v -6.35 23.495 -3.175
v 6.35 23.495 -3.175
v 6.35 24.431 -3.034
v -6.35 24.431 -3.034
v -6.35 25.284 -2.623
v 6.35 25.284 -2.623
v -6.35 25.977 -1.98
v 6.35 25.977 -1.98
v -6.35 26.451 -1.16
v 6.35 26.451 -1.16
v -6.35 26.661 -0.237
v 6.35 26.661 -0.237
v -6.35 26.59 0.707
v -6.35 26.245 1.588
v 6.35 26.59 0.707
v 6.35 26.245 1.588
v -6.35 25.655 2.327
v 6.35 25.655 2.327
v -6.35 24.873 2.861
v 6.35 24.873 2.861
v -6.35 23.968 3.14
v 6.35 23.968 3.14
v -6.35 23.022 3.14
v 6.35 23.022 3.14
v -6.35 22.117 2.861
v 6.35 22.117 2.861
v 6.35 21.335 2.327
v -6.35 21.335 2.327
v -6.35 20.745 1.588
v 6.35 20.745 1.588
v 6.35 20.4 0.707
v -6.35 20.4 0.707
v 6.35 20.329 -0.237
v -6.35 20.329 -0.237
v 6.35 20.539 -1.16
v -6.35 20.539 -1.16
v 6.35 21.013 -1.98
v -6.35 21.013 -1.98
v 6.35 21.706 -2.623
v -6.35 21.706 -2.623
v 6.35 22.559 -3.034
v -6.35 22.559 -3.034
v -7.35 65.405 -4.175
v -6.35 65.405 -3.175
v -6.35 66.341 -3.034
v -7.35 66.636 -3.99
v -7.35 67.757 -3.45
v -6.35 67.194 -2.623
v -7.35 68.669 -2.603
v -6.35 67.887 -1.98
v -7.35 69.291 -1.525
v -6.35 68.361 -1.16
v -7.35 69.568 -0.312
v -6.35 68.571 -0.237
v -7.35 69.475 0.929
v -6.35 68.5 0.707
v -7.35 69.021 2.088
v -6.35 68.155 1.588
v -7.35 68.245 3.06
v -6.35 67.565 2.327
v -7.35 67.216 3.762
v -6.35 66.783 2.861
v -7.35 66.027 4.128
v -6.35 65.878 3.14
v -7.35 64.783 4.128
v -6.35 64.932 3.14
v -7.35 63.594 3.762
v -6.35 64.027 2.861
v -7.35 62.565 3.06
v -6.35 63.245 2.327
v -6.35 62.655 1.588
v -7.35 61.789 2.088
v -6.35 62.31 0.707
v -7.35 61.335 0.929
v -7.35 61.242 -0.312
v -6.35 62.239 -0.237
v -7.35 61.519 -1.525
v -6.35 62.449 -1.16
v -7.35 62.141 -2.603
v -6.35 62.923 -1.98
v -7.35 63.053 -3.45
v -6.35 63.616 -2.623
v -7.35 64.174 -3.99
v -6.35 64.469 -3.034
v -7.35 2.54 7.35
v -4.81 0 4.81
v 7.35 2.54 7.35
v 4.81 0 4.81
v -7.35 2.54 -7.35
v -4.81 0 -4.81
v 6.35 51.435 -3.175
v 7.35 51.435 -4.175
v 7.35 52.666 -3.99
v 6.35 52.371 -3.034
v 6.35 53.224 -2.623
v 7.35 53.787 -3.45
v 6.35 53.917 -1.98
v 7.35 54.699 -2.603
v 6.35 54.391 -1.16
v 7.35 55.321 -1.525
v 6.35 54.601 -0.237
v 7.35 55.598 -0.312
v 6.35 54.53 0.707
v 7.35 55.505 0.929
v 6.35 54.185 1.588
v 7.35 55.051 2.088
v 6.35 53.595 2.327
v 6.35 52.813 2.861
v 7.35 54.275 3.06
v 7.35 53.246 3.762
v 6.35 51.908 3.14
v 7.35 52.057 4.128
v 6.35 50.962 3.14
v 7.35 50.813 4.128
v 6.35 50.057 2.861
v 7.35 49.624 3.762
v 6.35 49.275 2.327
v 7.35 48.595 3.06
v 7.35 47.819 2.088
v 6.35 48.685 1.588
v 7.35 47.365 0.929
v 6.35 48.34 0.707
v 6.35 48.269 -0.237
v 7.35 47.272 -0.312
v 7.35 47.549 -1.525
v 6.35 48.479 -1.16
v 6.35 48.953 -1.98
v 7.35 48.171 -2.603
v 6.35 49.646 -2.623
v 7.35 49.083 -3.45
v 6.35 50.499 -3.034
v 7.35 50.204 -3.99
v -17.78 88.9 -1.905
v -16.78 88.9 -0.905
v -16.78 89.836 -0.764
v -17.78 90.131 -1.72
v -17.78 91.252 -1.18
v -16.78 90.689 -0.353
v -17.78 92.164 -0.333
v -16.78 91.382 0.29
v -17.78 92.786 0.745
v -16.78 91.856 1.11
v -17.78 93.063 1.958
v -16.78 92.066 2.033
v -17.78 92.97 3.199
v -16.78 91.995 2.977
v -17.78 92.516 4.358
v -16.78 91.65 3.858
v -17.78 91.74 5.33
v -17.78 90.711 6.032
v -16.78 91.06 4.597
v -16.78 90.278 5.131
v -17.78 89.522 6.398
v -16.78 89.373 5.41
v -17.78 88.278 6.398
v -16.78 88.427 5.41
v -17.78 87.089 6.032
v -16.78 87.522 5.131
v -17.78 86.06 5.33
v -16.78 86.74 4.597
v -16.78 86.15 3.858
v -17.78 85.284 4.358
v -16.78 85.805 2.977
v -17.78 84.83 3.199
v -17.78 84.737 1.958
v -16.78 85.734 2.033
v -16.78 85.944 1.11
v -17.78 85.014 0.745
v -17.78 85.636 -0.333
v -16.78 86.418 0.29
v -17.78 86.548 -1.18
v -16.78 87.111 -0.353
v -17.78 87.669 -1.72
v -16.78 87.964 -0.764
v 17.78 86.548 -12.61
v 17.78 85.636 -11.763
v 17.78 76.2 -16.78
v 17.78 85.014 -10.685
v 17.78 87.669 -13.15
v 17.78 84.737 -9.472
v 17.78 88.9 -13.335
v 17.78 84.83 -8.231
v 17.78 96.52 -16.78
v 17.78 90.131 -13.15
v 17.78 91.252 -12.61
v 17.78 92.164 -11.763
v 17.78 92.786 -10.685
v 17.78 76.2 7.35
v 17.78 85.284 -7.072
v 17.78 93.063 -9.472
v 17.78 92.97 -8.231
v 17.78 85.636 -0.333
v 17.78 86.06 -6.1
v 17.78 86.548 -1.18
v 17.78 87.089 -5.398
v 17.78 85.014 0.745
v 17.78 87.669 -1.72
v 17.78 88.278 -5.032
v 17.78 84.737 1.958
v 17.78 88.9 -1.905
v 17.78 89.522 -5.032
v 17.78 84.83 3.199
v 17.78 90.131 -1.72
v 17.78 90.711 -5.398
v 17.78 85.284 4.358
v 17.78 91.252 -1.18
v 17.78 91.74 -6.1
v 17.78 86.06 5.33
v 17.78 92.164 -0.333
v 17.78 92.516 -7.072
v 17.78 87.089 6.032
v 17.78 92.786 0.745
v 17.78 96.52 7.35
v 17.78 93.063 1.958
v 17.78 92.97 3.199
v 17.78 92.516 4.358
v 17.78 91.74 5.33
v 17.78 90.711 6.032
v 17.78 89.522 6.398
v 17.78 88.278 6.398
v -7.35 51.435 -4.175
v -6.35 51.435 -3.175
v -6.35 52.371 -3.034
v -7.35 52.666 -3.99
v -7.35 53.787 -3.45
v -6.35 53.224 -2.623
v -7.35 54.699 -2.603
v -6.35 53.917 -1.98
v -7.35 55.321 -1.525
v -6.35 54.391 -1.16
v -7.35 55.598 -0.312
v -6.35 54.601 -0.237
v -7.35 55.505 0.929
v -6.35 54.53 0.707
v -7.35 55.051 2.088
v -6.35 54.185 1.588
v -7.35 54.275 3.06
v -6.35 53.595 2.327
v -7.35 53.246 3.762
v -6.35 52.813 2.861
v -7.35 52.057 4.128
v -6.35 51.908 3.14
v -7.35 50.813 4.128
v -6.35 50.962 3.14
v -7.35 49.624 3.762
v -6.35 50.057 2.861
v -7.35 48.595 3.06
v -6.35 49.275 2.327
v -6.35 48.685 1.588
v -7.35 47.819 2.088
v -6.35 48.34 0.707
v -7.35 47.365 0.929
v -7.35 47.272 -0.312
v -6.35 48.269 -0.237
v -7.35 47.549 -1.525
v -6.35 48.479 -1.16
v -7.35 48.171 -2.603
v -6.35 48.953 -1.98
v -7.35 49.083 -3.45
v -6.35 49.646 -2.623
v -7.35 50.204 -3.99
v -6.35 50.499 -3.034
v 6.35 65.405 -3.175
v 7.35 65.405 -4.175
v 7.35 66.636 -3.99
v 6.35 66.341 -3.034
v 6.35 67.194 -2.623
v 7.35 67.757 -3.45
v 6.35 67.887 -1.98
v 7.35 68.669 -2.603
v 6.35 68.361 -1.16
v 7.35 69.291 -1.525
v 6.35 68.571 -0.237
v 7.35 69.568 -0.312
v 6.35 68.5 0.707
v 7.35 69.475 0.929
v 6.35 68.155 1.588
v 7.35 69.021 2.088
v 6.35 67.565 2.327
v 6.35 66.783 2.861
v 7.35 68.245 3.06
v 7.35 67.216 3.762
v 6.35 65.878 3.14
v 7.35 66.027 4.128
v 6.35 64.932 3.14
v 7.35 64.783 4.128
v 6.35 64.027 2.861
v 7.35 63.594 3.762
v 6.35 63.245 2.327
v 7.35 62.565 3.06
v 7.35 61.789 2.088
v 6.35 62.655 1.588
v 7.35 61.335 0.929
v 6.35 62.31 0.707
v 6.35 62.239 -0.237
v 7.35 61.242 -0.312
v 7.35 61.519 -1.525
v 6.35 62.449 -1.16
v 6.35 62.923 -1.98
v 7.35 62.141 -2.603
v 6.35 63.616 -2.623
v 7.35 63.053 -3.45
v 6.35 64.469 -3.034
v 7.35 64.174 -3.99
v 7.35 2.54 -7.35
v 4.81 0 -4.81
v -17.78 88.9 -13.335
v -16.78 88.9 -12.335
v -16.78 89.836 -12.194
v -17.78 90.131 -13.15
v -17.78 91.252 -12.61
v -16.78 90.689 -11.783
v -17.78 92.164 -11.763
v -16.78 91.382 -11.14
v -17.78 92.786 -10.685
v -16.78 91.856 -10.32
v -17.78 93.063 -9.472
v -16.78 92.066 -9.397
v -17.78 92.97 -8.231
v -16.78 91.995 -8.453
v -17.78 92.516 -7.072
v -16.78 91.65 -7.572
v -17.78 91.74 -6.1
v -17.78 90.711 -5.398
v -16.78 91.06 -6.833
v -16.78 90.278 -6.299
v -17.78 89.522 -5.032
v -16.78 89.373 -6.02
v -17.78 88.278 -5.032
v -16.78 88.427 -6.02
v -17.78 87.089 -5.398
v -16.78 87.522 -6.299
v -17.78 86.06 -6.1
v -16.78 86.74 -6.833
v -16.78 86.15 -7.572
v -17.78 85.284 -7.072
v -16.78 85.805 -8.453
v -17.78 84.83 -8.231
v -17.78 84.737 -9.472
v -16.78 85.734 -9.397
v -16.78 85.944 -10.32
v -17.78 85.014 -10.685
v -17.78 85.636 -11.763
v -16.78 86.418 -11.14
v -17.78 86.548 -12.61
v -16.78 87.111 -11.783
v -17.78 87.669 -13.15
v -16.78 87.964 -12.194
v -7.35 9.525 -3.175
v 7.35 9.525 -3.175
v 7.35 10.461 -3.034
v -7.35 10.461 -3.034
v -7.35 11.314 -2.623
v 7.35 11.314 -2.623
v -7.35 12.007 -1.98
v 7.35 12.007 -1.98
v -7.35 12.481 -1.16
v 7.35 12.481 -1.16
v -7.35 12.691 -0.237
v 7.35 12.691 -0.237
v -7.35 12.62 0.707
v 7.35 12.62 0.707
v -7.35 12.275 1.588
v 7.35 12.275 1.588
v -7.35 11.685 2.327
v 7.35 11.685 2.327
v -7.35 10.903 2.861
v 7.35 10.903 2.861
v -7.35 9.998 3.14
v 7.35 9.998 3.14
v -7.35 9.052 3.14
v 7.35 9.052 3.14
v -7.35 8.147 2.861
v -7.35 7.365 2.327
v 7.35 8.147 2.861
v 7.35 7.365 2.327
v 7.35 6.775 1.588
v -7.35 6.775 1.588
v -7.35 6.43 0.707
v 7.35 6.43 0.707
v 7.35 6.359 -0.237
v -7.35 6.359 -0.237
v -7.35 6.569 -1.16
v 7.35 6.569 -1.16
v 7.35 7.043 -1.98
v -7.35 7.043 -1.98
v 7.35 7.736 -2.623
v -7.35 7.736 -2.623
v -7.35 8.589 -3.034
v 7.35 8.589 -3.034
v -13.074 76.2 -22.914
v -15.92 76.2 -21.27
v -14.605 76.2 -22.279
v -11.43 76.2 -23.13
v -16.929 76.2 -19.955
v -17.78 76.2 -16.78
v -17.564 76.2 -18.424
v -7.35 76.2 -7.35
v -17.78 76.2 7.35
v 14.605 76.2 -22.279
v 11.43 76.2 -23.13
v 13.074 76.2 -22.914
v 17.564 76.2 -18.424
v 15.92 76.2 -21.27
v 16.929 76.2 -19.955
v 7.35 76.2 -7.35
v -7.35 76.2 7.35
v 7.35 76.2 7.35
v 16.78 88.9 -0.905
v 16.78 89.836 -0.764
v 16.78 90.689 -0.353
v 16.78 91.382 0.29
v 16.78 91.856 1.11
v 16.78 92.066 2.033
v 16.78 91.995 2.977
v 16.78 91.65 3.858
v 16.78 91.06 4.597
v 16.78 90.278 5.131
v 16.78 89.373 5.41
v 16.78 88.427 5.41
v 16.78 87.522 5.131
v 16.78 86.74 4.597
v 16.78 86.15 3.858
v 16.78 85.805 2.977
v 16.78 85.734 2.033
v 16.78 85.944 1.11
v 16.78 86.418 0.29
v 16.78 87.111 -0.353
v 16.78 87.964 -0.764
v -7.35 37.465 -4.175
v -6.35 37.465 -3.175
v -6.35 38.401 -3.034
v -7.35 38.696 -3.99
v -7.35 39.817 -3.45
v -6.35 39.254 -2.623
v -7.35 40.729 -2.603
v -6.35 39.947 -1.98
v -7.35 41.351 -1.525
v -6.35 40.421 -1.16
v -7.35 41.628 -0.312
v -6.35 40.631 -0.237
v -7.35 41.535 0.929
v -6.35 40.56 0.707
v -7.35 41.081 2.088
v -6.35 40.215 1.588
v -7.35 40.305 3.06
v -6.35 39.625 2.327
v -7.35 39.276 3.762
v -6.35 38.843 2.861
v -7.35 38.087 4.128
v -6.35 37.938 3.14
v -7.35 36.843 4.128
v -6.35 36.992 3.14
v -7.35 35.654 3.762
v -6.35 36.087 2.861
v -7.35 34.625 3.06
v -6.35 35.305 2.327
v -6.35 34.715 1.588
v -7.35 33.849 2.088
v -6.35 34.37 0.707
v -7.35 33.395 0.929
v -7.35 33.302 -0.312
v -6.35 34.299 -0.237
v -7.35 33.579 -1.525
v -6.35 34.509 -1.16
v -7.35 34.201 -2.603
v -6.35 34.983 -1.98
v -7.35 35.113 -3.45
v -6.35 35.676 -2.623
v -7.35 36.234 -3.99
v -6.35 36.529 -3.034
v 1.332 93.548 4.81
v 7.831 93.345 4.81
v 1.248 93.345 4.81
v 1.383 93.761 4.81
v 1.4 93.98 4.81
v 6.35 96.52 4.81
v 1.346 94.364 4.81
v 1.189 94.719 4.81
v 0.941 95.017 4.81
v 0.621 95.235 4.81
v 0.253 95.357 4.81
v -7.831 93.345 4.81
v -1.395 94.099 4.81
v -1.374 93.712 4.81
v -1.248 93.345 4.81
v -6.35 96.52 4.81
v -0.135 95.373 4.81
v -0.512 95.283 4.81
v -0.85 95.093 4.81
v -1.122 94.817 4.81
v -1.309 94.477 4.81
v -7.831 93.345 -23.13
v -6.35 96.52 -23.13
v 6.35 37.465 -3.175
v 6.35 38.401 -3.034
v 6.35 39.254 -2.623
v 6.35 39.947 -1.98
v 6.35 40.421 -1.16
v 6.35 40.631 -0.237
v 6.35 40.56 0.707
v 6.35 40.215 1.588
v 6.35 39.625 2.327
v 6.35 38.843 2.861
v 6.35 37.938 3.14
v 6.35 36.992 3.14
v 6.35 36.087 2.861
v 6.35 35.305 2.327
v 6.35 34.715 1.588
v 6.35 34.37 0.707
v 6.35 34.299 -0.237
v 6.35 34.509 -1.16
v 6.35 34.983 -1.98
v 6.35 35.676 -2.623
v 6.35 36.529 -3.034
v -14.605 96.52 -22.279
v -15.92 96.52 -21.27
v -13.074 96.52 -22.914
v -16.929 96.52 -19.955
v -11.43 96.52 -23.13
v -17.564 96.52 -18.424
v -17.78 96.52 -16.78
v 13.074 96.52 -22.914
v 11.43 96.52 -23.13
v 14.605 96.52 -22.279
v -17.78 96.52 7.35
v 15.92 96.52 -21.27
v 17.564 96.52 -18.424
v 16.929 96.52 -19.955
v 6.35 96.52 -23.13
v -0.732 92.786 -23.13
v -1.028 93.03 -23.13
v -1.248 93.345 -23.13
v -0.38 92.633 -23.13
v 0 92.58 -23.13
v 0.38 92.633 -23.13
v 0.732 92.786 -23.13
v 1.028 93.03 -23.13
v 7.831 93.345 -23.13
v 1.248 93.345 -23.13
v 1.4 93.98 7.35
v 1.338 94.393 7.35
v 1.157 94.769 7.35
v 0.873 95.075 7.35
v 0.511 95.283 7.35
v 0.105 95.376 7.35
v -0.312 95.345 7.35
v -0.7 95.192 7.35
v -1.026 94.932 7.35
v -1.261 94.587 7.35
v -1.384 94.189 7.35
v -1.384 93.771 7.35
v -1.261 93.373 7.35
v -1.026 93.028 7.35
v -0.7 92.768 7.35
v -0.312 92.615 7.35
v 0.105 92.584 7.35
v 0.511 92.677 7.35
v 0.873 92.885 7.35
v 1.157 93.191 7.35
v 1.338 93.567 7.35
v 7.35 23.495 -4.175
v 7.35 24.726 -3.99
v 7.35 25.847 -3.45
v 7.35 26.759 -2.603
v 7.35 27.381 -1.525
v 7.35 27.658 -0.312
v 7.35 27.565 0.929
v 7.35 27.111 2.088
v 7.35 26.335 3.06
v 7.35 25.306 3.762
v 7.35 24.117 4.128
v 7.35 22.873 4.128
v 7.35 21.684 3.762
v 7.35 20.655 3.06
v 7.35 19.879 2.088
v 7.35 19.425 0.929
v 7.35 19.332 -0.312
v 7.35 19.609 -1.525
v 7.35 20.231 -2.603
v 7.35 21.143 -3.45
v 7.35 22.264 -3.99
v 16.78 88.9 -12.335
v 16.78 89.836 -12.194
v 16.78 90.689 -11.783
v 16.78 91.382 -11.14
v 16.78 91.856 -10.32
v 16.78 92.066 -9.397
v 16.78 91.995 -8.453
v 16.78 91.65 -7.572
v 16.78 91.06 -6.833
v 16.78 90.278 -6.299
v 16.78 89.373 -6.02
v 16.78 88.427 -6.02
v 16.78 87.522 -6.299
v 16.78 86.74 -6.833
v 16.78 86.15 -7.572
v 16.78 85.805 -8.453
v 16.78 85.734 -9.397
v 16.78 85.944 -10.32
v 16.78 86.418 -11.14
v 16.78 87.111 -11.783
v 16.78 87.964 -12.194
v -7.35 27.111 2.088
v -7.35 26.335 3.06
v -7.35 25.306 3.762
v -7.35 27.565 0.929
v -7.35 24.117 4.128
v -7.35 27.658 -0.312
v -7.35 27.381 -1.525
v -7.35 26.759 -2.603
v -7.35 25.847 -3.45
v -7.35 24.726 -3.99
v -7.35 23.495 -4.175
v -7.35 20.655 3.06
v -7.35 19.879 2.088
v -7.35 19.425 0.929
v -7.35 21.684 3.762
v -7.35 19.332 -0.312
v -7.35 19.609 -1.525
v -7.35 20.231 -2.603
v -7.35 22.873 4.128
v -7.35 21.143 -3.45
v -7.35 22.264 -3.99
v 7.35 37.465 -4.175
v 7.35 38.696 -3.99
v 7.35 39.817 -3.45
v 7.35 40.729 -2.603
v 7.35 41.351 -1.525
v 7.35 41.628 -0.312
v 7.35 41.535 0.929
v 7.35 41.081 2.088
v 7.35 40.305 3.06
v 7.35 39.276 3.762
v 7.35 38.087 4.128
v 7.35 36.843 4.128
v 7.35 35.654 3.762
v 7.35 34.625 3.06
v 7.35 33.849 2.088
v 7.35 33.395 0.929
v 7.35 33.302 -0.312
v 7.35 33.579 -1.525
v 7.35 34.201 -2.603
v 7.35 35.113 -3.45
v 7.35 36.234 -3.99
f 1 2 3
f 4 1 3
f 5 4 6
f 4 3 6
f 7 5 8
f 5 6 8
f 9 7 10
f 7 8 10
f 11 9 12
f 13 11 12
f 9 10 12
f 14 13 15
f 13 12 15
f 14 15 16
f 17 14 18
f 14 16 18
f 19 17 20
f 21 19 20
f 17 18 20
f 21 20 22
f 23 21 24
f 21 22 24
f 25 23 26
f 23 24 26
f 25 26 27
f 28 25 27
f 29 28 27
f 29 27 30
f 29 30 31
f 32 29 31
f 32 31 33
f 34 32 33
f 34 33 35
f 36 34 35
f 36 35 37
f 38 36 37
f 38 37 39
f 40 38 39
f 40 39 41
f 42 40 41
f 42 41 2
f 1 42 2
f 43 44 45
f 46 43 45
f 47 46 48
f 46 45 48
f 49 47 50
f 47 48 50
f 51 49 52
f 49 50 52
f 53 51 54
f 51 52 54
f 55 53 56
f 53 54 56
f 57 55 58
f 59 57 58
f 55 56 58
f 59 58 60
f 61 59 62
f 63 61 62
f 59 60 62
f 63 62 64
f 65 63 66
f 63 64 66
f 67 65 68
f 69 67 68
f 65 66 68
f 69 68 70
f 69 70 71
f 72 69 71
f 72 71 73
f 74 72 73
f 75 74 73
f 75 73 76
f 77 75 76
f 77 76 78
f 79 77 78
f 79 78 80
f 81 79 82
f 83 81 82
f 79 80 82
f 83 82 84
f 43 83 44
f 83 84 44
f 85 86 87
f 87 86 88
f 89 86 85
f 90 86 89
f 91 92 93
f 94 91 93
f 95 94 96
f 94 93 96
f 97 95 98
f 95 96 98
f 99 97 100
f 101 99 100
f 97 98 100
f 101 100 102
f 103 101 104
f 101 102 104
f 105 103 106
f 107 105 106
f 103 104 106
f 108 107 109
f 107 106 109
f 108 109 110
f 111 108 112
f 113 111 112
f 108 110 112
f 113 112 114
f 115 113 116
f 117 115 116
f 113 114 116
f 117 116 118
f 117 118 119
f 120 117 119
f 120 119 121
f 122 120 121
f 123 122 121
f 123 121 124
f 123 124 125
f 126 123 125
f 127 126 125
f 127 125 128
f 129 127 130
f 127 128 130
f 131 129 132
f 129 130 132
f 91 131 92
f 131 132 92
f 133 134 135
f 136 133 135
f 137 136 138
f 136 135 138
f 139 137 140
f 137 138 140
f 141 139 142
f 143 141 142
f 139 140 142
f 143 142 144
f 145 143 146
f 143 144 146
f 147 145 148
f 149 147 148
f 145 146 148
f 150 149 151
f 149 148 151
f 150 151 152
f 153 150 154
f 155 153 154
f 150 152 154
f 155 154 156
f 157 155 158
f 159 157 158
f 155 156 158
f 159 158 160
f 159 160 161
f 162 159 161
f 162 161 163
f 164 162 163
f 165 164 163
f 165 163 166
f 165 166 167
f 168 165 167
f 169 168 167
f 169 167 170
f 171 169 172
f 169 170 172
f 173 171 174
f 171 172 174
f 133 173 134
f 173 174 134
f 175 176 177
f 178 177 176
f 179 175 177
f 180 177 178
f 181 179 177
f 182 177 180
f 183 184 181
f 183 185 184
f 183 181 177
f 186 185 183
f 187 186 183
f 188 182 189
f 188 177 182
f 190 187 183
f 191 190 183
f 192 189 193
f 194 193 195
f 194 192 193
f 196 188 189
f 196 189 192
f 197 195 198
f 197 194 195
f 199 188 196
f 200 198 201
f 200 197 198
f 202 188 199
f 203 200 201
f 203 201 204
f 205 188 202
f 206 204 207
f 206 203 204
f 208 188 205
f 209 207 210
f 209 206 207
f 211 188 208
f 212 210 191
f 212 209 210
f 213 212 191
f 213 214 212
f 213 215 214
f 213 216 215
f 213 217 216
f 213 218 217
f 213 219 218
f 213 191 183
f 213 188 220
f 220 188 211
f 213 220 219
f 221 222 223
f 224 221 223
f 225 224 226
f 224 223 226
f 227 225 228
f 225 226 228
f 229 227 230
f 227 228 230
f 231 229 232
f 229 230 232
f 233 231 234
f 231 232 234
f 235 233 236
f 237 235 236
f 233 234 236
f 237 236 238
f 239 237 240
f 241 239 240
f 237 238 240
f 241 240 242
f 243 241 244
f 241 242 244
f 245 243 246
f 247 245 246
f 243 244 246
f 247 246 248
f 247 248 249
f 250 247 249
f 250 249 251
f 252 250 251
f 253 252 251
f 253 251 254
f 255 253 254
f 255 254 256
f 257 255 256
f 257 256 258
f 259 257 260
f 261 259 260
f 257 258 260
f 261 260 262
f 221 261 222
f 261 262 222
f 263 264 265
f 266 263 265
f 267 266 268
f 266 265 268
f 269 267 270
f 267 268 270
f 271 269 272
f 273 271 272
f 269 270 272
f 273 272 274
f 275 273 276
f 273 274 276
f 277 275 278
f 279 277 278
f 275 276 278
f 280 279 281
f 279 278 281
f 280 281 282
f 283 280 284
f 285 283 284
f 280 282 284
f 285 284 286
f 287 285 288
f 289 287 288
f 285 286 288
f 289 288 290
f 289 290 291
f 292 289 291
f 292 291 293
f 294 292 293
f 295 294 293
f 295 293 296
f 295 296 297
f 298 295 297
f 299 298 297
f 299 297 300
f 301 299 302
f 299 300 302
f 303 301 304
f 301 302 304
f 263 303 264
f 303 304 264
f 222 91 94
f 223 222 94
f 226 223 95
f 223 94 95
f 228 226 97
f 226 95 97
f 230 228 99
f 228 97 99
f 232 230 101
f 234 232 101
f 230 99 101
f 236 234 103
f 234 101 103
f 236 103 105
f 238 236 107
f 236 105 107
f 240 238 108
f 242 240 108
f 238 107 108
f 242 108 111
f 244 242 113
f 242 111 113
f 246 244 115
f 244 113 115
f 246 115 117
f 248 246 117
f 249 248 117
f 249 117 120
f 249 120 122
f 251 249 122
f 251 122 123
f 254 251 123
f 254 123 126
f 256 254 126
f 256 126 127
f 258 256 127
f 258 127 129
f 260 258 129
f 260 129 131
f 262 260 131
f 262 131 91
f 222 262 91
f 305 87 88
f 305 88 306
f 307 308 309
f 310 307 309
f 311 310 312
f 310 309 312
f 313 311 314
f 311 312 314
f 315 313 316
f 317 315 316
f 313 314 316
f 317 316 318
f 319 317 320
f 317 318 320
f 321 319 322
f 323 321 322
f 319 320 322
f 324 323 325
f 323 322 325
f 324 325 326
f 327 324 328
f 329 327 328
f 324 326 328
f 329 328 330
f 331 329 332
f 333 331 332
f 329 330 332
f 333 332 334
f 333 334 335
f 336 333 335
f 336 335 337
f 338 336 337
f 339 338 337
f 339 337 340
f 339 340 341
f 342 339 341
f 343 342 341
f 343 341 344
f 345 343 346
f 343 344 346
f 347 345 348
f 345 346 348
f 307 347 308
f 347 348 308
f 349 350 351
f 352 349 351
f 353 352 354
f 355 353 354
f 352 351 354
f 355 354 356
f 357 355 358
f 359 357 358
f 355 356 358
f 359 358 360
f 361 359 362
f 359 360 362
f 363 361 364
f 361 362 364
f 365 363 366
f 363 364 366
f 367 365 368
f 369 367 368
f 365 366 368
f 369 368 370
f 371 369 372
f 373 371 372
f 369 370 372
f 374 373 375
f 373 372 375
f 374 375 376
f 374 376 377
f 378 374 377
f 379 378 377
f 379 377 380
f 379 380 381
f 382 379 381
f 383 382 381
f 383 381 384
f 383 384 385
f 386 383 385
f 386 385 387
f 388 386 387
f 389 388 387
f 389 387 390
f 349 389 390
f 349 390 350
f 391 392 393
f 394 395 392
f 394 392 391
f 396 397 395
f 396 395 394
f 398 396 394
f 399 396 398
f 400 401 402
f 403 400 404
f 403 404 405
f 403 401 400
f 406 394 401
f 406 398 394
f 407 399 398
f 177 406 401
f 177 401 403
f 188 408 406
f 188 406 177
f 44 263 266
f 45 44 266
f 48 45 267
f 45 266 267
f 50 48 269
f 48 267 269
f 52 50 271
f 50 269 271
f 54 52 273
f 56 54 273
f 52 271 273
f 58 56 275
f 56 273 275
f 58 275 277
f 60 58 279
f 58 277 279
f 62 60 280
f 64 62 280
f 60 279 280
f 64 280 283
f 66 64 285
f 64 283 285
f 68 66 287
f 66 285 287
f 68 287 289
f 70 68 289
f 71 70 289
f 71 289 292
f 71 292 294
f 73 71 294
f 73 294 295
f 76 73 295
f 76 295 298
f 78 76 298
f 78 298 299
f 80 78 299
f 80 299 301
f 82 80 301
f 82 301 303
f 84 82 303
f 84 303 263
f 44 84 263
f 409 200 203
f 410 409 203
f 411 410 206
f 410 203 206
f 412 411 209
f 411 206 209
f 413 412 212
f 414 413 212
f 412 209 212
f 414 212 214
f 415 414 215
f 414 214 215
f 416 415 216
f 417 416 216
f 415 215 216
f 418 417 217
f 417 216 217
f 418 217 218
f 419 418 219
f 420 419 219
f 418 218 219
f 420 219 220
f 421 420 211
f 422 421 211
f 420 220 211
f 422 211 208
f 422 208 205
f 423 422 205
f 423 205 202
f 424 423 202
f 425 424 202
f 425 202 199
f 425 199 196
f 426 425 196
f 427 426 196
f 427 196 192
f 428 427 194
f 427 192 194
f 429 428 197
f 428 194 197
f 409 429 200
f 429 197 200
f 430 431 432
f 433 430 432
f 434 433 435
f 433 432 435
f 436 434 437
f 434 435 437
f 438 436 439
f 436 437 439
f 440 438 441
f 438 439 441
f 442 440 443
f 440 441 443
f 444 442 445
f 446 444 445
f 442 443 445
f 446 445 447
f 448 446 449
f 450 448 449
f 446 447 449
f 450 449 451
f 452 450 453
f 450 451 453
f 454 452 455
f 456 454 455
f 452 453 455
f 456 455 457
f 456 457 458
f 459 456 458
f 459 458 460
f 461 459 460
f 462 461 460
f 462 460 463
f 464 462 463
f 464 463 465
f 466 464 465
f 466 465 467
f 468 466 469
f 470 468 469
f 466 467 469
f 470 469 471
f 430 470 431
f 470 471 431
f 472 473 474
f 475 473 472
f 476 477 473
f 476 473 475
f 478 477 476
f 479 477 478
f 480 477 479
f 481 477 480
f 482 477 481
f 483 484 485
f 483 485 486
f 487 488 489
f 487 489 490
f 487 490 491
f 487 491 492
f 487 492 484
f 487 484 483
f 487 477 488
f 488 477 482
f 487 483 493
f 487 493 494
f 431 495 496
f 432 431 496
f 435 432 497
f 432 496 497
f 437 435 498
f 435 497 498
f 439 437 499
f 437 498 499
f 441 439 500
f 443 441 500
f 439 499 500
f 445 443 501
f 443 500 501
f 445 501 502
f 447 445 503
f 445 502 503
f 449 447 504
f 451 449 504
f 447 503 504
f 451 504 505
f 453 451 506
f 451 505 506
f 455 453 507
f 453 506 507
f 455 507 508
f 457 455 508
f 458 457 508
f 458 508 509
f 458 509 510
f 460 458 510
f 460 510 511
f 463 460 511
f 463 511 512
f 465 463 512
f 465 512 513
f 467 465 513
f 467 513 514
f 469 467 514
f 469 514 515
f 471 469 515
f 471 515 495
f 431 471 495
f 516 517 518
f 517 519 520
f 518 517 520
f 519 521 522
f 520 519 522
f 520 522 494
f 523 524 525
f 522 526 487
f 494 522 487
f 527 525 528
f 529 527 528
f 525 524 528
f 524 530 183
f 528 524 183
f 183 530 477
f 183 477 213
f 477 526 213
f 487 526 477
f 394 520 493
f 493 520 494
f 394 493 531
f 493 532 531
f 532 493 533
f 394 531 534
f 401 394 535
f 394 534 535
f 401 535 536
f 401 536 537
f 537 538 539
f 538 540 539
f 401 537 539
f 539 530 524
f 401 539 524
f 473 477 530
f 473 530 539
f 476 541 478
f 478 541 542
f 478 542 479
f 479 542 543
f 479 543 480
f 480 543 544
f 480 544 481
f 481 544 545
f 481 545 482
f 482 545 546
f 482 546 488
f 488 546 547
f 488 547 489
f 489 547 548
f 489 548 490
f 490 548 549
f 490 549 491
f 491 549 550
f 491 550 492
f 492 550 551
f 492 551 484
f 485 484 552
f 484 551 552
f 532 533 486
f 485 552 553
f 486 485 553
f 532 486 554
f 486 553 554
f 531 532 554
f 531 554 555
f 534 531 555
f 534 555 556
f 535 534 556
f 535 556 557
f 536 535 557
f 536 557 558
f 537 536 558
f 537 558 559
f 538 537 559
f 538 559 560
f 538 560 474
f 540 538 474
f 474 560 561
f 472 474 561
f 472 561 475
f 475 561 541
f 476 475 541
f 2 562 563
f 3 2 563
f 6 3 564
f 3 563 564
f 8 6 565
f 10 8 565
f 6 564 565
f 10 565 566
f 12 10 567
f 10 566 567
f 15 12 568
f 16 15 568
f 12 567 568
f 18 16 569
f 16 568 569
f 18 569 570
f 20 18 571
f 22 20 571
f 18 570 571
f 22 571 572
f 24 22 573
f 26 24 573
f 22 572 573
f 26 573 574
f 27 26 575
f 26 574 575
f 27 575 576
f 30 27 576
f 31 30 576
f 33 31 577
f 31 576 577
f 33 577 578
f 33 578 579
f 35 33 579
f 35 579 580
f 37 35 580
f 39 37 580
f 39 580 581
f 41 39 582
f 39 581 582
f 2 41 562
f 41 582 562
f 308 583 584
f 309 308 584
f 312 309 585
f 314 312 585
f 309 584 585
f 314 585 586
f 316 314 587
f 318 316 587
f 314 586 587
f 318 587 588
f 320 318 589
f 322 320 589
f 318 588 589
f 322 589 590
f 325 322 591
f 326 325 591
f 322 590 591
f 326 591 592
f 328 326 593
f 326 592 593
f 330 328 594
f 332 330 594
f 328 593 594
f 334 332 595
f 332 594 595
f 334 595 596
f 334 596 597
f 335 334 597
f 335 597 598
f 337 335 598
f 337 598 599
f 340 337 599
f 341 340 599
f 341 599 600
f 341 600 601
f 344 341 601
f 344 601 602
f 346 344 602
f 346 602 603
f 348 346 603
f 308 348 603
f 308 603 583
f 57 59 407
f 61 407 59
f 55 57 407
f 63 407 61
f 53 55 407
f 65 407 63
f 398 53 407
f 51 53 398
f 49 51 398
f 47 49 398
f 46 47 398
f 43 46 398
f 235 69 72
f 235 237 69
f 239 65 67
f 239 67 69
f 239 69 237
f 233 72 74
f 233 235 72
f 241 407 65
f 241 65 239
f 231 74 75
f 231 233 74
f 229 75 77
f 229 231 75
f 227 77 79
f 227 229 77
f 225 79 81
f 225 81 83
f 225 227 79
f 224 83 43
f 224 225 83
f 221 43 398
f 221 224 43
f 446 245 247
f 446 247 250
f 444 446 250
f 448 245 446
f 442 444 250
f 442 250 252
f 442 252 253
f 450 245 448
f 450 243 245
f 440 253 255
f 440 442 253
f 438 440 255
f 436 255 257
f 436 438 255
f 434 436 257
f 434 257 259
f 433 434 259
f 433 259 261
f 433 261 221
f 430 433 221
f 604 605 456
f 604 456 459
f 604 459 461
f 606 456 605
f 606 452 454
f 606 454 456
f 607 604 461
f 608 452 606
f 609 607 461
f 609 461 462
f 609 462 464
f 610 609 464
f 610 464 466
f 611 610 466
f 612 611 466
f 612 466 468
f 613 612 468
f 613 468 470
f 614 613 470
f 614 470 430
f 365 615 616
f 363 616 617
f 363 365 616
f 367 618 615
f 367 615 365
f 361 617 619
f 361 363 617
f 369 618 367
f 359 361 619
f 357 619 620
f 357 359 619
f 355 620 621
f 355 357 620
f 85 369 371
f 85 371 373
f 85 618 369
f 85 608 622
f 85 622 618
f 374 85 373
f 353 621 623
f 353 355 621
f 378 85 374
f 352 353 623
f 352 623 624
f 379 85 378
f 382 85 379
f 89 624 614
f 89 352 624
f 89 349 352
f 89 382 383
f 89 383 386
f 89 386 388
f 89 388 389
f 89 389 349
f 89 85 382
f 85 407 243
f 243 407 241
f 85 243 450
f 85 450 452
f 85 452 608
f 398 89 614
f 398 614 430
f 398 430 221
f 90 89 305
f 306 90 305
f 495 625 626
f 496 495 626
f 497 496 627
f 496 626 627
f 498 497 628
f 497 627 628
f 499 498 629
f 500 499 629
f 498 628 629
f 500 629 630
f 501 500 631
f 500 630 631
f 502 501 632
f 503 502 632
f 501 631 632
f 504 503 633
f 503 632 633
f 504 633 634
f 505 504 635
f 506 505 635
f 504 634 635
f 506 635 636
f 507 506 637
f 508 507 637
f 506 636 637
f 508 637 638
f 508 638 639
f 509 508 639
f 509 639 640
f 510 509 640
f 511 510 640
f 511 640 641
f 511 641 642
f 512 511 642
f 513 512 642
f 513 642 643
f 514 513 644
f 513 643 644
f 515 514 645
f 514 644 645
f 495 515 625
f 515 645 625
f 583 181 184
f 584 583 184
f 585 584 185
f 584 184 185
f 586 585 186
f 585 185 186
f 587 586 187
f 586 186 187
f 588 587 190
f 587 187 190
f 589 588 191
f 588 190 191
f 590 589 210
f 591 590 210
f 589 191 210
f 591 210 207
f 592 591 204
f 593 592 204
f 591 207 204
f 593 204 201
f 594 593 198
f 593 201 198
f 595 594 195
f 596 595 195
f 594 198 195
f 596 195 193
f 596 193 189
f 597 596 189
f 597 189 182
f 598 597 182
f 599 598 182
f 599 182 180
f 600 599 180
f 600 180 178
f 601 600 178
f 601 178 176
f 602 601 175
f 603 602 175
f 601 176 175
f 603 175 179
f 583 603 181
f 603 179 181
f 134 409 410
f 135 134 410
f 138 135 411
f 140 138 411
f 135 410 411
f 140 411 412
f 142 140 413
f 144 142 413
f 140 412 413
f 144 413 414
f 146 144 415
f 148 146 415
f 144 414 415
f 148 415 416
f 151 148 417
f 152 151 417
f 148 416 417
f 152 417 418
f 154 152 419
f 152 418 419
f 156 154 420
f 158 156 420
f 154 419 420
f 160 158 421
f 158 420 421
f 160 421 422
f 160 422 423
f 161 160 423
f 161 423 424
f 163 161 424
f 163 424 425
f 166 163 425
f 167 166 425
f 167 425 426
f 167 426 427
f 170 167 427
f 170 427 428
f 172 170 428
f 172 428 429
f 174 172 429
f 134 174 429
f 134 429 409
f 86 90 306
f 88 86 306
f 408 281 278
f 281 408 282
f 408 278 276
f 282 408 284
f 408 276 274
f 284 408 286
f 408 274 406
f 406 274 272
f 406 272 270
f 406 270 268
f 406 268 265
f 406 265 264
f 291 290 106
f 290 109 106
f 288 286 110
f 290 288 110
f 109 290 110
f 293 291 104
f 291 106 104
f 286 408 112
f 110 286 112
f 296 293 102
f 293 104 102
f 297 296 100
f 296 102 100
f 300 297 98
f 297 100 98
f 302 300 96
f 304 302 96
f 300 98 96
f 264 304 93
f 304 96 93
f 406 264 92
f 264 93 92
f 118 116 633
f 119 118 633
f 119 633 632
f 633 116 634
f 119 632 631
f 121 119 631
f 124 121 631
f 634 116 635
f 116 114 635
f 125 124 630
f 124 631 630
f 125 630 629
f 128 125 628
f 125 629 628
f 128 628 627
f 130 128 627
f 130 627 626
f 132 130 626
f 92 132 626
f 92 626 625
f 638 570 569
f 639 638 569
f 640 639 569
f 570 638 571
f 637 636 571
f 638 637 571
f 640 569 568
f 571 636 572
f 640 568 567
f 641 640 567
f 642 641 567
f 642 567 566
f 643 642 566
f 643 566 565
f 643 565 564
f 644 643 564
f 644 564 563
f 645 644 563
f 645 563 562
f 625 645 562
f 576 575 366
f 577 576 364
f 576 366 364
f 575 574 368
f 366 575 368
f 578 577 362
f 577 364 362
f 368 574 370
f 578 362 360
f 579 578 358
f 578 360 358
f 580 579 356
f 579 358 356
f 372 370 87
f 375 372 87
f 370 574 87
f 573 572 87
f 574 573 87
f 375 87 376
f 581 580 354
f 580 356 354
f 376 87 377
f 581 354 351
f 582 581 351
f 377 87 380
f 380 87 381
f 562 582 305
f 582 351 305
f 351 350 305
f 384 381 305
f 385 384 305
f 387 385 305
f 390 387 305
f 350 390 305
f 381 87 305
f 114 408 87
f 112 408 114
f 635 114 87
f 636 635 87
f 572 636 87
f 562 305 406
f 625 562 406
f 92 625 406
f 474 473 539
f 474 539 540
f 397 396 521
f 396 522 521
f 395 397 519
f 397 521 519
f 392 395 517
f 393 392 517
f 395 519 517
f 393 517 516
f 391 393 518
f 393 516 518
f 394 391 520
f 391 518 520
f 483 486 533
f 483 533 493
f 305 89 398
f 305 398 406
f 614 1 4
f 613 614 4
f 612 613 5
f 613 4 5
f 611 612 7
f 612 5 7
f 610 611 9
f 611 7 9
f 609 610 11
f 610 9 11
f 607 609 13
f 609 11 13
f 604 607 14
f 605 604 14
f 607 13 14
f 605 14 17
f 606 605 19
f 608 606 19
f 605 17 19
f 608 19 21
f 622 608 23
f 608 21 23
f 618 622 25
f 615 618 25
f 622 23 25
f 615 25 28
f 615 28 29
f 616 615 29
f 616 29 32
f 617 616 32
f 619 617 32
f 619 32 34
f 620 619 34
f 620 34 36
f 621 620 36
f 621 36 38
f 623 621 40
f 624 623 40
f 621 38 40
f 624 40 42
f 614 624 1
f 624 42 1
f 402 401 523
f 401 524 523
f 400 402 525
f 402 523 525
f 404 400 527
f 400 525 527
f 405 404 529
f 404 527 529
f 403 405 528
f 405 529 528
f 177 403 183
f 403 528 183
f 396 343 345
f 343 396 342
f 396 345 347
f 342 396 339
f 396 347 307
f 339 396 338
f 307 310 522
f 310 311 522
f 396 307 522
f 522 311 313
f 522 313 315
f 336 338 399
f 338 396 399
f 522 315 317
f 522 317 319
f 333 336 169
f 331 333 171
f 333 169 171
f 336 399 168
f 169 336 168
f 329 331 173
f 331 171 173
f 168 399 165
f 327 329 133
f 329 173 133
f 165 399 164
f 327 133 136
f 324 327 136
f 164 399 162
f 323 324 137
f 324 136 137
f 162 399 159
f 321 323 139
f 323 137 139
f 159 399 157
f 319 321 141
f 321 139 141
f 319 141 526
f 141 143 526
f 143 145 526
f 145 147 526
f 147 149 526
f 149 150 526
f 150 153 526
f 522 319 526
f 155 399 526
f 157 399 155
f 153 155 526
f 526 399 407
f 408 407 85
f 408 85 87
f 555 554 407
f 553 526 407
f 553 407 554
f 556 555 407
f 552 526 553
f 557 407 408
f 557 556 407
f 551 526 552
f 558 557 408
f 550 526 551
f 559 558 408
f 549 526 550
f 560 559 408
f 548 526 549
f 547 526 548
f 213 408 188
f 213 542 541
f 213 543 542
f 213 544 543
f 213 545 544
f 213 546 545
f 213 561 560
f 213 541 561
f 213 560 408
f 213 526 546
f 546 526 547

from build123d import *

# Parameters (mm, degrees)
SKETCH1_W                 = 14.7
SKETCH1_H                 = 14.7
BOSS_EXTRUDE1_DEPTH       = 76.2
SKETCH6_R                 = 3.175
CUT_EXTRUDE4_DEPTH        = 78.952244997
CHAMFER5_SIZE             = 1
CHAMFER6_SIZE             = 2.54
SKETCH4_W                 = 35.56
SKETCH4_H                 = 20.32
BOSS_EXTRUDE2_DEPTH       = 30.48
SKETCH5_R                 = 3.175
TRAYSUPPORTMOUNTING_DEPTH = 106.430644976
CHAMFER4_SIZE             = 1
CUT_EXTRUDE5_DEPTH        = 27.94
FILLET1_R                 = 6.35
SKETCH8_R                 = 1.4
CUT_EXTRUDE6_DEPTH        = 103.768035887


with BuildPart() as part:
    # Sketch1 → Boss-Extrude1 (new body)
    with BuildSketch(Plane(origin=(0, 0, 0), x_dir=(1, 0, 0), z_dir=(0, 1, 0))):
        Rectangle(SKETCH1_W, SKETCH1_H)
    extrude(amount=BOSS_EXTRUDE1_DEPTH)

    # Sketch6 → Cut-Extrude4 (cut, through all)
    with BuildSketch(Plane(origin=(7.35, 0, 0), x_dir=(0, 0, -1), z_dir=(1, 0, 0))):
        with Locations((0, 65.405)):
            Circle(SKETCH6_R)
        with Locations((0, 51.435)):
            Circle(SKETCH6_R)
        with Locations((0, 37.465)):
            Circle(SKETCH6_R)
        with Locations((0, 23.495)):
            Circle(SKETCH6_R)
        with Locations((0, 9.525)):
            Circle(SKETCH6_R)
    extrude(amount=-CUT_EXTRUDE4_DEPTH, mode=Mode.SUBTRACT)

    # Chamfer5
    chamfer5_edges = [part.edges().sort_by_distance(p)[0] for p in [
        (-7.35, 65.405, 3.175),
        (7.35, 65.405, 3.175),
        (-7.35, 51.435, 3.175),
        (7.35, 51.435, 3.175),
        (-7.35, 37.465, 3.175),
        (7.35, 37.465, 3.175),
        (-7.35, 23.495, 3.175),
        (7.35, 23.495, 3.175),
    ]]
    chamfer(chamfer5_edges, length=CHAMFER5_SIZE)

    # Chamfer6
    chamfer6_edges = [part.edges().sort_by_distance(p)[0] for p in [
        (0, 0, -7.35),
        (7.35, 0, 0),
        (0, 0, 7.35),
        (-7.35, 0, 0),
    ]]
    chamfer(chamfer6_edges, length=CHAMFER6_SIZE)

    # Sketch4 → Boss-Extrude2 (add)
    with BuildSketch(Plane.XY.offset(7.35)):
        with Locations((0, 86.36)):
            Rectangle(SKETCH4_W, SKETCH4_H)
    extrude(amount=-BOSS_EXTRUDE2_DEPTH)

    # Sketch5 → TraySupportMounting (cut, through all)
    with BuildSketch(Plane(origin=(17.78, 0, 0), x_dir=(0, 0, -1), z_dir=(1, 0, 0))):
        with Locations((9.16, 88.9)):
            Circle(SKETCH5_R)
        with Locations((-2.27, 88.9)):
            Circle(SKETCH5_R)
    extrude(amount=-TRAYSUPPORTMOUNTING_DEPTH, mode=Mode.SUBTRACT)

    # Chamfer4
    chamfer4_edges = [part.edges().sort_by_distance(p)[0] for p in [
        (-17.78, 88.9, -5.985),
        (17.78, 88.9, -5.985),
        (-17.78, 88.9, 5.445),
        (17.78, 88.9, 5.445),
    ]]
    chamfer(chamfer4_edges, length=CHAMFER4_SIZE)

    # Sketch7 → Cut-Extrude5 (cut)
    with BuildSketch(Plane(origin=(0, 0, -23.13), x_dir=(-1, 0, 0), z_dir=(0, 0, -1))):
        Polygon((-6.35, 96.52), (-7.830526815, 93.345), (7.830526815, 93.345), (6.35, 96.52), align=None)
    extrude(amount=-CUT_EXTRUDE5_DEPTH, mode=Mode.SUBTRACT)

    # Fillet1
    fillet1_edges = [part.edges().sort_by_distance(p)[0] for p in [
        (-17.78, 86.36, -23.13),
        (17.78, 86.36, -23.13),
    ]]
    fillet(fillet1_edges, radius=FILLET1_R)

    # Sketch8 → Cut-Extrude6 (cut, through all)
    with BuildSketch(Plane.XY.offset(7.35)):
        with Locations((0, 93.98)):
            Circle(SKETCH8_R)
    extrude(amount=-CUT_EXTRUDE6_DEPTH, mode=Mode.SUBTRACT)


solid = part.part
